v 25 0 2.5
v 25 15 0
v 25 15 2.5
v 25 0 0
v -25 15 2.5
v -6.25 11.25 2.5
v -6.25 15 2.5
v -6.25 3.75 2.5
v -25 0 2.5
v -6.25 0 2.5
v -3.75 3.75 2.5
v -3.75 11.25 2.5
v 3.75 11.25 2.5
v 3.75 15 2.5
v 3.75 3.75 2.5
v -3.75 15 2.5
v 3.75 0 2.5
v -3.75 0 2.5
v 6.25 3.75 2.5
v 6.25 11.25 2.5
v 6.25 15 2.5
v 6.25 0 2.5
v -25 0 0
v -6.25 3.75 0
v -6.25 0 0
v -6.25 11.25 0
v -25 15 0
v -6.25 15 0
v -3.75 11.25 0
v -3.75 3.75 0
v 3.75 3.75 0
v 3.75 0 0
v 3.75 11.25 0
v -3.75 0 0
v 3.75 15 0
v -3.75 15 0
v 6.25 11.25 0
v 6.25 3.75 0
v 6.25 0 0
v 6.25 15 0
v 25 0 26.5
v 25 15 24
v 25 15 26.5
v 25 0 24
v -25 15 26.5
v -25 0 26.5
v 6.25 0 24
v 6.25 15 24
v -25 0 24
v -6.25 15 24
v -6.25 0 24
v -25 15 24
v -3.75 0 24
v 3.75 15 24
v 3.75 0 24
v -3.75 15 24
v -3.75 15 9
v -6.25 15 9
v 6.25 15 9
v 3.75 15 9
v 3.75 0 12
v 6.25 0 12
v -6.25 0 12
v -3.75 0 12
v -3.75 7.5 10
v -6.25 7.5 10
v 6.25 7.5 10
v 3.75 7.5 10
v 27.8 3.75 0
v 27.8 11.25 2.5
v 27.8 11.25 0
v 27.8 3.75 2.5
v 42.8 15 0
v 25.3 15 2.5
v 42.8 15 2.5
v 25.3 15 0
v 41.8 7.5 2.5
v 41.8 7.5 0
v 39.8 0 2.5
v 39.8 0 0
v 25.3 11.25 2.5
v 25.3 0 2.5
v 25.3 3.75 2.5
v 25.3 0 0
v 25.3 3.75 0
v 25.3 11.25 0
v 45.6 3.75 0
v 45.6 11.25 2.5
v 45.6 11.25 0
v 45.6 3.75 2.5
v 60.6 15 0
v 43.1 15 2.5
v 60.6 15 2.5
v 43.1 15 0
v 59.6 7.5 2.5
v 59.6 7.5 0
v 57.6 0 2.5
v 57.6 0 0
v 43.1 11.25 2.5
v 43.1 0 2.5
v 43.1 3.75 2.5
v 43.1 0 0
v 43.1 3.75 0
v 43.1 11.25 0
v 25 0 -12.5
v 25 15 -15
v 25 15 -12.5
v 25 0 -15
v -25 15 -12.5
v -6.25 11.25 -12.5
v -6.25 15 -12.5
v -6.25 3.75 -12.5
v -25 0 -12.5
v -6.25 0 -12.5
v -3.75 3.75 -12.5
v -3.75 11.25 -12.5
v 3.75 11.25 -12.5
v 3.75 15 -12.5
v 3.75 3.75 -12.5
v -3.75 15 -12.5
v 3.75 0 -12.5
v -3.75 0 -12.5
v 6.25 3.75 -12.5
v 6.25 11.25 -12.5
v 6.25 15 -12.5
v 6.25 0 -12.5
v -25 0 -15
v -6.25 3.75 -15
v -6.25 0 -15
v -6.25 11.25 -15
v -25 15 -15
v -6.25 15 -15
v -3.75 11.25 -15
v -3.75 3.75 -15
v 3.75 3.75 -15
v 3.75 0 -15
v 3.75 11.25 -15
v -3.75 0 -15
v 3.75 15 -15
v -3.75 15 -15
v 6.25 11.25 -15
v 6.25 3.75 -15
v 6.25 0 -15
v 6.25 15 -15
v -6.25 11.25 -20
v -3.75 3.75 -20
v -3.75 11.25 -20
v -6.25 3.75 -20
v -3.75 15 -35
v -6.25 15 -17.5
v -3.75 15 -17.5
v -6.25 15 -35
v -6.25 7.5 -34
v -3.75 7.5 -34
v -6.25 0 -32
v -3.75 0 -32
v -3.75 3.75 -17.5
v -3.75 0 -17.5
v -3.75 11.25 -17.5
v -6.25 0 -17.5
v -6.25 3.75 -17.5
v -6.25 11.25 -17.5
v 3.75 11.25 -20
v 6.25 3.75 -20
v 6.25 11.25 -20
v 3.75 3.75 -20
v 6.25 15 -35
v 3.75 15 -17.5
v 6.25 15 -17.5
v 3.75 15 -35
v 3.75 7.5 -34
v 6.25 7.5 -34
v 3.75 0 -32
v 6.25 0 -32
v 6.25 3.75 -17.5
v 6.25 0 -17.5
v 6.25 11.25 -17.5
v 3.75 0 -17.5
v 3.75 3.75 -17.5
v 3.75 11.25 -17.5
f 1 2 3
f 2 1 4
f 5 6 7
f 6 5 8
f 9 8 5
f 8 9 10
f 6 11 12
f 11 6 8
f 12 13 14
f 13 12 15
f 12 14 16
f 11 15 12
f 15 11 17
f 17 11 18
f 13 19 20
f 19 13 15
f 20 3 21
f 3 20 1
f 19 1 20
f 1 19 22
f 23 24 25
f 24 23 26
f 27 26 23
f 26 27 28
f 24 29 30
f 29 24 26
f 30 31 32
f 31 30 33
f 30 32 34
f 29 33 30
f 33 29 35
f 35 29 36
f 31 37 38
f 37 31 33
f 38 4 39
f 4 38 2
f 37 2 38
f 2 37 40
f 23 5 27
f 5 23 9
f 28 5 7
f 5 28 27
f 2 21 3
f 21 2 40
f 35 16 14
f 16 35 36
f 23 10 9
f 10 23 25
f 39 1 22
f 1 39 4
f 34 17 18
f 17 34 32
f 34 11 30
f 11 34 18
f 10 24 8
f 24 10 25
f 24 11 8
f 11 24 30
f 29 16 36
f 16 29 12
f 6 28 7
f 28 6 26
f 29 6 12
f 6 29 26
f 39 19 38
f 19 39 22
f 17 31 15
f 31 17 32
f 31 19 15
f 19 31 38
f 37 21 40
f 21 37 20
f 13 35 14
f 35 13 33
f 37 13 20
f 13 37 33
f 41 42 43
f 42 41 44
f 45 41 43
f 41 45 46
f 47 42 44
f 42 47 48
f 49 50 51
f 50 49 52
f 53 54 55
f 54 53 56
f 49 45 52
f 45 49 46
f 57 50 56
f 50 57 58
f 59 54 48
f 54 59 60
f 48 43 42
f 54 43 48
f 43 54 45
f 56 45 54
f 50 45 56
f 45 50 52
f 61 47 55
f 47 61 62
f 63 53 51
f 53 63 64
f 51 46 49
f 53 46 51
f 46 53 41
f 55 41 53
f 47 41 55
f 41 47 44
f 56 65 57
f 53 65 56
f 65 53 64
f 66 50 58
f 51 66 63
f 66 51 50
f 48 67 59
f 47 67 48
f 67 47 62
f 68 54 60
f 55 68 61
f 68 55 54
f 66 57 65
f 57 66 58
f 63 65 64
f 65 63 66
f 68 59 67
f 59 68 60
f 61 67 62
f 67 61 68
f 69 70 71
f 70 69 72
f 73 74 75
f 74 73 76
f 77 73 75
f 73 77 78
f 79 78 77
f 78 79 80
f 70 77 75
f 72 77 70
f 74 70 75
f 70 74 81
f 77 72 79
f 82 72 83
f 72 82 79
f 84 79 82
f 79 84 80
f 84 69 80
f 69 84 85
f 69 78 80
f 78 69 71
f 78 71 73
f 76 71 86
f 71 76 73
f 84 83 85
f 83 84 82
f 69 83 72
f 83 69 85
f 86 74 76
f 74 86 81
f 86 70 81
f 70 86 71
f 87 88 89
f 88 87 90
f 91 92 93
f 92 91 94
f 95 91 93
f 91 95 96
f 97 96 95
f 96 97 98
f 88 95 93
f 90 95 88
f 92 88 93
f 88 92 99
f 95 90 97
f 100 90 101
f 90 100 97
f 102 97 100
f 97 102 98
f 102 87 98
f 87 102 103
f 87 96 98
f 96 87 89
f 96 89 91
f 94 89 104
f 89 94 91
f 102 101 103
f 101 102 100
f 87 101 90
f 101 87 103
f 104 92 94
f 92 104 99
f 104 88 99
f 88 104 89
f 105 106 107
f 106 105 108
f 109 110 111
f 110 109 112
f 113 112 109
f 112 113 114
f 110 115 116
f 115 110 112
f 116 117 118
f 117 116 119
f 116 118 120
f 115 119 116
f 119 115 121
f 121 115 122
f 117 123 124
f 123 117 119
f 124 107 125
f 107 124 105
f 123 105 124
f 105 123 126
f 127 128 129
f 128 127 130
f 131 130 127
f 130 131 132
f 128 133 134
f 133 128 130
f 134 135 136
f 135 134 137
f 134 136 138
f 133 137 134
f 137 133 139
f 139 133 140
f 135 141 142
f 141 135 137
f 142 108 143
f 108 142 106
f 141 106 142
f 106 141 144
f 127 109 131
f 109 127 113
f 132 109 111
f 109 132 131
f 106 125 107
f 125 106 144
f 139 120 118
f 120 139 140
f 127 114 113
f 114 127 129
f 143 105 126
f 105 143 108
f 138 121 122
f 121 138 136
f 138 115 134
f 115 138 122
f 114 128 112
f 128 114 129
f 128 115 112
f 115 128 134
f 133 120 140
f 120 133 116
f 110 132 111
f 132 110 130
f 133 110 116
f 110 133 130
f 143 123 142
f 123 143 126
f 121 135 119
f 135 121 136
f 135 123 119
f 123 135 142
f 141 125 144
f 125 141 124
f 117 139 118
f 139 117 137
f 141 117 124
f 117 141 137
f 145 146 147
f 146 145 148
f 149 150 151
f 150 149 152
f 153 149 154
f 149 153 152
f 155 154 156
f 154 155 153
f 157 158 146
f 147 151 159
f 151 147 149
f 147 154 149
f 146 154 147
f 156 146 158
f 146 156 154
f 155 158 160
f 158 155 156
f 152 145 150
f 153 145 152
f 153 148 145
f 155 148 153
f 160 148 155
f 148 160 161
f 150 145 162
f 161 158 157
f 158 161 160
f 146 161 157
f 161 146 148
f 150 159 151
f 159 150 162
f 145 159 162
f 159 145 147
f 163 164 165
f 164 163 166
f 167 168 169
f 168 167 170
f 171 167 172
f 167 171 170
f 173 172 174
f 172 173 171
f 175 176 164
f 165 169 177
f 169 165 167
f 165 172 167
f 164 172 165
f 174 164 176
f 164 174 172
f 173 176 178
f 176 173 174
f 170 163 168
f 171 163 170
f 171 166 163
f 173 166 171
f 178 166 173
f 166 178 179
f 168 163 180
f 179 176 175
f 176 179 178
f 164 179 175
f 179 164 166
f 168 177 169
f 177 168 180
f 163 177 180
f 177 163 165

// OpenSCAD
space = 0.3;

// Thicknes of the used wood (material thickness)
matThick = 2.5;

seatWidth = 15;

seatLength = 50;

legHeightFront = 12;
legHeightMiddle = legHeightFront + 2;
legHeightBack = legHeightMiddle + 1;
legHeight = legHeightMiddle;
legDistance = 10;
legRoundingRadius = 0.4 * legHeight;

boltWidth = matThick * 1.5;

explosionDistance = 5;

module seat() {
	color("blue") {
		difference() {
			// main part of the seat
			translate([- seatLength / 2, 0, 0])
				cube([seatLength, seatWidth, matThick]);
			// hole for left bolt #1
			translate([-(matThick / 2) - (legDistance / 2), 0, 0])
				translate([0, -space, -space])
				cube([matThick, boltWidth + space, matThick + 2*space]);
			// hole for left bolt #2
			translate([-(matThick / 2) - (legDistance / 2), seatWidth - boltWidth, 0])
				translate([0, 0, -space])
				cube([matThick, boltWidth + space, matThick + 2*space]);
			// hole for right bolt #1
			translate([-(matThick / 2) + (legDistance / 2), 0, 0])
				translate([0, -space, -space])
				cube([matThick, boltWidth + space, matThick + 2*space]);
			// hole for right bolt #2
			translate([-(matThick / 2) + (legDistance / 2), seatWidth - boltWidth, 0])
				translate([0, 0, -space])
				cube([matThick, boltWidth + space, matThick + 2*space]);
		}
	}
}

module leg() {
	color("red") {
		/*
		intersection() {
			// main part of the leg
			cube([legHeight, seatWidth, matThick]);
			// this makes it round on the bottom
			//translate([- legRoundingRadius + legHeight, seatWidth / 2, 0])
			//	cylinder(3 * matThick, legRoundingRadius, legRoundingRadius, true, $fn = 1000);
			translate([0, seatWidth /2, 0])
				translate([- legRoundingRadius + legHeight, 0, 0])
					cylinder(3 * matThick, legRoundingRadius, legRoundingRadius, true, $fn = 1000);
		};
		*/
		linear_extrude(matThick) {
			polygon([[0, 0], [legHeightFront, 0], [legHeightMiddle, seatWidth  / 2], [legHeightBack, seatWidth], [0, seatWidth]]);
		};
		// bolt #1 of the leg
		translate([- matThick, 0, 0])
			cube([matThick, boltWidth, matThick]);
		// bolt #2 of the leg
		translate([- matThick, seatWidth - boltWidth, 0])
			cube([matThick, boltWidth, matThick]);
	}
}

module legStanding() {
	rotate(90, [0, 1, 0])
		leg();
}

module legLeft() {
	translate([-(matThick / 2) - (legDistance / 2), 0, 0])
		legStanding();
}

module legRight() {
	translate([-(matThick / 2) + (legDistance / 2), 0, 0])
		legStanding();
}

/*
*/

module viewAssembled() {

	seat();
	legLeft();
	legRight();
}

module viewExploded() {

	seat();
	translate([0, 0, -explosionDistance])
		union() {
			legLeft();
			legRight();
		};
}

module viewPlate() {

	seat();
	translate([seatLength / 2 + matThick + space, 0, 0]) {
		leg();
		translate([legHeightBack + matThick + space, 0, 0])
			leg();
	};
}

translate([0, 0, legHeightBack + 30 * space])
	viewAssembled();
viewPlate();
translate([0, 0, -(50 * space)])
	viewExploded();

//leg();



//cube([legHeight, seatWidth, matThick]);
/*
polygon([[0, 0], [legHeightFront, 0], [legHeightMiddle, seatWidth  / 2], [legHeightBack, seatWidth], [0, seatWidth]]);
translate([0, seatWidth /2, 0])
	translate([- legRoundingRadius + legHeight, 0, 0])
	%circle(legRoundingRadius, $fn = 1000);
*/
